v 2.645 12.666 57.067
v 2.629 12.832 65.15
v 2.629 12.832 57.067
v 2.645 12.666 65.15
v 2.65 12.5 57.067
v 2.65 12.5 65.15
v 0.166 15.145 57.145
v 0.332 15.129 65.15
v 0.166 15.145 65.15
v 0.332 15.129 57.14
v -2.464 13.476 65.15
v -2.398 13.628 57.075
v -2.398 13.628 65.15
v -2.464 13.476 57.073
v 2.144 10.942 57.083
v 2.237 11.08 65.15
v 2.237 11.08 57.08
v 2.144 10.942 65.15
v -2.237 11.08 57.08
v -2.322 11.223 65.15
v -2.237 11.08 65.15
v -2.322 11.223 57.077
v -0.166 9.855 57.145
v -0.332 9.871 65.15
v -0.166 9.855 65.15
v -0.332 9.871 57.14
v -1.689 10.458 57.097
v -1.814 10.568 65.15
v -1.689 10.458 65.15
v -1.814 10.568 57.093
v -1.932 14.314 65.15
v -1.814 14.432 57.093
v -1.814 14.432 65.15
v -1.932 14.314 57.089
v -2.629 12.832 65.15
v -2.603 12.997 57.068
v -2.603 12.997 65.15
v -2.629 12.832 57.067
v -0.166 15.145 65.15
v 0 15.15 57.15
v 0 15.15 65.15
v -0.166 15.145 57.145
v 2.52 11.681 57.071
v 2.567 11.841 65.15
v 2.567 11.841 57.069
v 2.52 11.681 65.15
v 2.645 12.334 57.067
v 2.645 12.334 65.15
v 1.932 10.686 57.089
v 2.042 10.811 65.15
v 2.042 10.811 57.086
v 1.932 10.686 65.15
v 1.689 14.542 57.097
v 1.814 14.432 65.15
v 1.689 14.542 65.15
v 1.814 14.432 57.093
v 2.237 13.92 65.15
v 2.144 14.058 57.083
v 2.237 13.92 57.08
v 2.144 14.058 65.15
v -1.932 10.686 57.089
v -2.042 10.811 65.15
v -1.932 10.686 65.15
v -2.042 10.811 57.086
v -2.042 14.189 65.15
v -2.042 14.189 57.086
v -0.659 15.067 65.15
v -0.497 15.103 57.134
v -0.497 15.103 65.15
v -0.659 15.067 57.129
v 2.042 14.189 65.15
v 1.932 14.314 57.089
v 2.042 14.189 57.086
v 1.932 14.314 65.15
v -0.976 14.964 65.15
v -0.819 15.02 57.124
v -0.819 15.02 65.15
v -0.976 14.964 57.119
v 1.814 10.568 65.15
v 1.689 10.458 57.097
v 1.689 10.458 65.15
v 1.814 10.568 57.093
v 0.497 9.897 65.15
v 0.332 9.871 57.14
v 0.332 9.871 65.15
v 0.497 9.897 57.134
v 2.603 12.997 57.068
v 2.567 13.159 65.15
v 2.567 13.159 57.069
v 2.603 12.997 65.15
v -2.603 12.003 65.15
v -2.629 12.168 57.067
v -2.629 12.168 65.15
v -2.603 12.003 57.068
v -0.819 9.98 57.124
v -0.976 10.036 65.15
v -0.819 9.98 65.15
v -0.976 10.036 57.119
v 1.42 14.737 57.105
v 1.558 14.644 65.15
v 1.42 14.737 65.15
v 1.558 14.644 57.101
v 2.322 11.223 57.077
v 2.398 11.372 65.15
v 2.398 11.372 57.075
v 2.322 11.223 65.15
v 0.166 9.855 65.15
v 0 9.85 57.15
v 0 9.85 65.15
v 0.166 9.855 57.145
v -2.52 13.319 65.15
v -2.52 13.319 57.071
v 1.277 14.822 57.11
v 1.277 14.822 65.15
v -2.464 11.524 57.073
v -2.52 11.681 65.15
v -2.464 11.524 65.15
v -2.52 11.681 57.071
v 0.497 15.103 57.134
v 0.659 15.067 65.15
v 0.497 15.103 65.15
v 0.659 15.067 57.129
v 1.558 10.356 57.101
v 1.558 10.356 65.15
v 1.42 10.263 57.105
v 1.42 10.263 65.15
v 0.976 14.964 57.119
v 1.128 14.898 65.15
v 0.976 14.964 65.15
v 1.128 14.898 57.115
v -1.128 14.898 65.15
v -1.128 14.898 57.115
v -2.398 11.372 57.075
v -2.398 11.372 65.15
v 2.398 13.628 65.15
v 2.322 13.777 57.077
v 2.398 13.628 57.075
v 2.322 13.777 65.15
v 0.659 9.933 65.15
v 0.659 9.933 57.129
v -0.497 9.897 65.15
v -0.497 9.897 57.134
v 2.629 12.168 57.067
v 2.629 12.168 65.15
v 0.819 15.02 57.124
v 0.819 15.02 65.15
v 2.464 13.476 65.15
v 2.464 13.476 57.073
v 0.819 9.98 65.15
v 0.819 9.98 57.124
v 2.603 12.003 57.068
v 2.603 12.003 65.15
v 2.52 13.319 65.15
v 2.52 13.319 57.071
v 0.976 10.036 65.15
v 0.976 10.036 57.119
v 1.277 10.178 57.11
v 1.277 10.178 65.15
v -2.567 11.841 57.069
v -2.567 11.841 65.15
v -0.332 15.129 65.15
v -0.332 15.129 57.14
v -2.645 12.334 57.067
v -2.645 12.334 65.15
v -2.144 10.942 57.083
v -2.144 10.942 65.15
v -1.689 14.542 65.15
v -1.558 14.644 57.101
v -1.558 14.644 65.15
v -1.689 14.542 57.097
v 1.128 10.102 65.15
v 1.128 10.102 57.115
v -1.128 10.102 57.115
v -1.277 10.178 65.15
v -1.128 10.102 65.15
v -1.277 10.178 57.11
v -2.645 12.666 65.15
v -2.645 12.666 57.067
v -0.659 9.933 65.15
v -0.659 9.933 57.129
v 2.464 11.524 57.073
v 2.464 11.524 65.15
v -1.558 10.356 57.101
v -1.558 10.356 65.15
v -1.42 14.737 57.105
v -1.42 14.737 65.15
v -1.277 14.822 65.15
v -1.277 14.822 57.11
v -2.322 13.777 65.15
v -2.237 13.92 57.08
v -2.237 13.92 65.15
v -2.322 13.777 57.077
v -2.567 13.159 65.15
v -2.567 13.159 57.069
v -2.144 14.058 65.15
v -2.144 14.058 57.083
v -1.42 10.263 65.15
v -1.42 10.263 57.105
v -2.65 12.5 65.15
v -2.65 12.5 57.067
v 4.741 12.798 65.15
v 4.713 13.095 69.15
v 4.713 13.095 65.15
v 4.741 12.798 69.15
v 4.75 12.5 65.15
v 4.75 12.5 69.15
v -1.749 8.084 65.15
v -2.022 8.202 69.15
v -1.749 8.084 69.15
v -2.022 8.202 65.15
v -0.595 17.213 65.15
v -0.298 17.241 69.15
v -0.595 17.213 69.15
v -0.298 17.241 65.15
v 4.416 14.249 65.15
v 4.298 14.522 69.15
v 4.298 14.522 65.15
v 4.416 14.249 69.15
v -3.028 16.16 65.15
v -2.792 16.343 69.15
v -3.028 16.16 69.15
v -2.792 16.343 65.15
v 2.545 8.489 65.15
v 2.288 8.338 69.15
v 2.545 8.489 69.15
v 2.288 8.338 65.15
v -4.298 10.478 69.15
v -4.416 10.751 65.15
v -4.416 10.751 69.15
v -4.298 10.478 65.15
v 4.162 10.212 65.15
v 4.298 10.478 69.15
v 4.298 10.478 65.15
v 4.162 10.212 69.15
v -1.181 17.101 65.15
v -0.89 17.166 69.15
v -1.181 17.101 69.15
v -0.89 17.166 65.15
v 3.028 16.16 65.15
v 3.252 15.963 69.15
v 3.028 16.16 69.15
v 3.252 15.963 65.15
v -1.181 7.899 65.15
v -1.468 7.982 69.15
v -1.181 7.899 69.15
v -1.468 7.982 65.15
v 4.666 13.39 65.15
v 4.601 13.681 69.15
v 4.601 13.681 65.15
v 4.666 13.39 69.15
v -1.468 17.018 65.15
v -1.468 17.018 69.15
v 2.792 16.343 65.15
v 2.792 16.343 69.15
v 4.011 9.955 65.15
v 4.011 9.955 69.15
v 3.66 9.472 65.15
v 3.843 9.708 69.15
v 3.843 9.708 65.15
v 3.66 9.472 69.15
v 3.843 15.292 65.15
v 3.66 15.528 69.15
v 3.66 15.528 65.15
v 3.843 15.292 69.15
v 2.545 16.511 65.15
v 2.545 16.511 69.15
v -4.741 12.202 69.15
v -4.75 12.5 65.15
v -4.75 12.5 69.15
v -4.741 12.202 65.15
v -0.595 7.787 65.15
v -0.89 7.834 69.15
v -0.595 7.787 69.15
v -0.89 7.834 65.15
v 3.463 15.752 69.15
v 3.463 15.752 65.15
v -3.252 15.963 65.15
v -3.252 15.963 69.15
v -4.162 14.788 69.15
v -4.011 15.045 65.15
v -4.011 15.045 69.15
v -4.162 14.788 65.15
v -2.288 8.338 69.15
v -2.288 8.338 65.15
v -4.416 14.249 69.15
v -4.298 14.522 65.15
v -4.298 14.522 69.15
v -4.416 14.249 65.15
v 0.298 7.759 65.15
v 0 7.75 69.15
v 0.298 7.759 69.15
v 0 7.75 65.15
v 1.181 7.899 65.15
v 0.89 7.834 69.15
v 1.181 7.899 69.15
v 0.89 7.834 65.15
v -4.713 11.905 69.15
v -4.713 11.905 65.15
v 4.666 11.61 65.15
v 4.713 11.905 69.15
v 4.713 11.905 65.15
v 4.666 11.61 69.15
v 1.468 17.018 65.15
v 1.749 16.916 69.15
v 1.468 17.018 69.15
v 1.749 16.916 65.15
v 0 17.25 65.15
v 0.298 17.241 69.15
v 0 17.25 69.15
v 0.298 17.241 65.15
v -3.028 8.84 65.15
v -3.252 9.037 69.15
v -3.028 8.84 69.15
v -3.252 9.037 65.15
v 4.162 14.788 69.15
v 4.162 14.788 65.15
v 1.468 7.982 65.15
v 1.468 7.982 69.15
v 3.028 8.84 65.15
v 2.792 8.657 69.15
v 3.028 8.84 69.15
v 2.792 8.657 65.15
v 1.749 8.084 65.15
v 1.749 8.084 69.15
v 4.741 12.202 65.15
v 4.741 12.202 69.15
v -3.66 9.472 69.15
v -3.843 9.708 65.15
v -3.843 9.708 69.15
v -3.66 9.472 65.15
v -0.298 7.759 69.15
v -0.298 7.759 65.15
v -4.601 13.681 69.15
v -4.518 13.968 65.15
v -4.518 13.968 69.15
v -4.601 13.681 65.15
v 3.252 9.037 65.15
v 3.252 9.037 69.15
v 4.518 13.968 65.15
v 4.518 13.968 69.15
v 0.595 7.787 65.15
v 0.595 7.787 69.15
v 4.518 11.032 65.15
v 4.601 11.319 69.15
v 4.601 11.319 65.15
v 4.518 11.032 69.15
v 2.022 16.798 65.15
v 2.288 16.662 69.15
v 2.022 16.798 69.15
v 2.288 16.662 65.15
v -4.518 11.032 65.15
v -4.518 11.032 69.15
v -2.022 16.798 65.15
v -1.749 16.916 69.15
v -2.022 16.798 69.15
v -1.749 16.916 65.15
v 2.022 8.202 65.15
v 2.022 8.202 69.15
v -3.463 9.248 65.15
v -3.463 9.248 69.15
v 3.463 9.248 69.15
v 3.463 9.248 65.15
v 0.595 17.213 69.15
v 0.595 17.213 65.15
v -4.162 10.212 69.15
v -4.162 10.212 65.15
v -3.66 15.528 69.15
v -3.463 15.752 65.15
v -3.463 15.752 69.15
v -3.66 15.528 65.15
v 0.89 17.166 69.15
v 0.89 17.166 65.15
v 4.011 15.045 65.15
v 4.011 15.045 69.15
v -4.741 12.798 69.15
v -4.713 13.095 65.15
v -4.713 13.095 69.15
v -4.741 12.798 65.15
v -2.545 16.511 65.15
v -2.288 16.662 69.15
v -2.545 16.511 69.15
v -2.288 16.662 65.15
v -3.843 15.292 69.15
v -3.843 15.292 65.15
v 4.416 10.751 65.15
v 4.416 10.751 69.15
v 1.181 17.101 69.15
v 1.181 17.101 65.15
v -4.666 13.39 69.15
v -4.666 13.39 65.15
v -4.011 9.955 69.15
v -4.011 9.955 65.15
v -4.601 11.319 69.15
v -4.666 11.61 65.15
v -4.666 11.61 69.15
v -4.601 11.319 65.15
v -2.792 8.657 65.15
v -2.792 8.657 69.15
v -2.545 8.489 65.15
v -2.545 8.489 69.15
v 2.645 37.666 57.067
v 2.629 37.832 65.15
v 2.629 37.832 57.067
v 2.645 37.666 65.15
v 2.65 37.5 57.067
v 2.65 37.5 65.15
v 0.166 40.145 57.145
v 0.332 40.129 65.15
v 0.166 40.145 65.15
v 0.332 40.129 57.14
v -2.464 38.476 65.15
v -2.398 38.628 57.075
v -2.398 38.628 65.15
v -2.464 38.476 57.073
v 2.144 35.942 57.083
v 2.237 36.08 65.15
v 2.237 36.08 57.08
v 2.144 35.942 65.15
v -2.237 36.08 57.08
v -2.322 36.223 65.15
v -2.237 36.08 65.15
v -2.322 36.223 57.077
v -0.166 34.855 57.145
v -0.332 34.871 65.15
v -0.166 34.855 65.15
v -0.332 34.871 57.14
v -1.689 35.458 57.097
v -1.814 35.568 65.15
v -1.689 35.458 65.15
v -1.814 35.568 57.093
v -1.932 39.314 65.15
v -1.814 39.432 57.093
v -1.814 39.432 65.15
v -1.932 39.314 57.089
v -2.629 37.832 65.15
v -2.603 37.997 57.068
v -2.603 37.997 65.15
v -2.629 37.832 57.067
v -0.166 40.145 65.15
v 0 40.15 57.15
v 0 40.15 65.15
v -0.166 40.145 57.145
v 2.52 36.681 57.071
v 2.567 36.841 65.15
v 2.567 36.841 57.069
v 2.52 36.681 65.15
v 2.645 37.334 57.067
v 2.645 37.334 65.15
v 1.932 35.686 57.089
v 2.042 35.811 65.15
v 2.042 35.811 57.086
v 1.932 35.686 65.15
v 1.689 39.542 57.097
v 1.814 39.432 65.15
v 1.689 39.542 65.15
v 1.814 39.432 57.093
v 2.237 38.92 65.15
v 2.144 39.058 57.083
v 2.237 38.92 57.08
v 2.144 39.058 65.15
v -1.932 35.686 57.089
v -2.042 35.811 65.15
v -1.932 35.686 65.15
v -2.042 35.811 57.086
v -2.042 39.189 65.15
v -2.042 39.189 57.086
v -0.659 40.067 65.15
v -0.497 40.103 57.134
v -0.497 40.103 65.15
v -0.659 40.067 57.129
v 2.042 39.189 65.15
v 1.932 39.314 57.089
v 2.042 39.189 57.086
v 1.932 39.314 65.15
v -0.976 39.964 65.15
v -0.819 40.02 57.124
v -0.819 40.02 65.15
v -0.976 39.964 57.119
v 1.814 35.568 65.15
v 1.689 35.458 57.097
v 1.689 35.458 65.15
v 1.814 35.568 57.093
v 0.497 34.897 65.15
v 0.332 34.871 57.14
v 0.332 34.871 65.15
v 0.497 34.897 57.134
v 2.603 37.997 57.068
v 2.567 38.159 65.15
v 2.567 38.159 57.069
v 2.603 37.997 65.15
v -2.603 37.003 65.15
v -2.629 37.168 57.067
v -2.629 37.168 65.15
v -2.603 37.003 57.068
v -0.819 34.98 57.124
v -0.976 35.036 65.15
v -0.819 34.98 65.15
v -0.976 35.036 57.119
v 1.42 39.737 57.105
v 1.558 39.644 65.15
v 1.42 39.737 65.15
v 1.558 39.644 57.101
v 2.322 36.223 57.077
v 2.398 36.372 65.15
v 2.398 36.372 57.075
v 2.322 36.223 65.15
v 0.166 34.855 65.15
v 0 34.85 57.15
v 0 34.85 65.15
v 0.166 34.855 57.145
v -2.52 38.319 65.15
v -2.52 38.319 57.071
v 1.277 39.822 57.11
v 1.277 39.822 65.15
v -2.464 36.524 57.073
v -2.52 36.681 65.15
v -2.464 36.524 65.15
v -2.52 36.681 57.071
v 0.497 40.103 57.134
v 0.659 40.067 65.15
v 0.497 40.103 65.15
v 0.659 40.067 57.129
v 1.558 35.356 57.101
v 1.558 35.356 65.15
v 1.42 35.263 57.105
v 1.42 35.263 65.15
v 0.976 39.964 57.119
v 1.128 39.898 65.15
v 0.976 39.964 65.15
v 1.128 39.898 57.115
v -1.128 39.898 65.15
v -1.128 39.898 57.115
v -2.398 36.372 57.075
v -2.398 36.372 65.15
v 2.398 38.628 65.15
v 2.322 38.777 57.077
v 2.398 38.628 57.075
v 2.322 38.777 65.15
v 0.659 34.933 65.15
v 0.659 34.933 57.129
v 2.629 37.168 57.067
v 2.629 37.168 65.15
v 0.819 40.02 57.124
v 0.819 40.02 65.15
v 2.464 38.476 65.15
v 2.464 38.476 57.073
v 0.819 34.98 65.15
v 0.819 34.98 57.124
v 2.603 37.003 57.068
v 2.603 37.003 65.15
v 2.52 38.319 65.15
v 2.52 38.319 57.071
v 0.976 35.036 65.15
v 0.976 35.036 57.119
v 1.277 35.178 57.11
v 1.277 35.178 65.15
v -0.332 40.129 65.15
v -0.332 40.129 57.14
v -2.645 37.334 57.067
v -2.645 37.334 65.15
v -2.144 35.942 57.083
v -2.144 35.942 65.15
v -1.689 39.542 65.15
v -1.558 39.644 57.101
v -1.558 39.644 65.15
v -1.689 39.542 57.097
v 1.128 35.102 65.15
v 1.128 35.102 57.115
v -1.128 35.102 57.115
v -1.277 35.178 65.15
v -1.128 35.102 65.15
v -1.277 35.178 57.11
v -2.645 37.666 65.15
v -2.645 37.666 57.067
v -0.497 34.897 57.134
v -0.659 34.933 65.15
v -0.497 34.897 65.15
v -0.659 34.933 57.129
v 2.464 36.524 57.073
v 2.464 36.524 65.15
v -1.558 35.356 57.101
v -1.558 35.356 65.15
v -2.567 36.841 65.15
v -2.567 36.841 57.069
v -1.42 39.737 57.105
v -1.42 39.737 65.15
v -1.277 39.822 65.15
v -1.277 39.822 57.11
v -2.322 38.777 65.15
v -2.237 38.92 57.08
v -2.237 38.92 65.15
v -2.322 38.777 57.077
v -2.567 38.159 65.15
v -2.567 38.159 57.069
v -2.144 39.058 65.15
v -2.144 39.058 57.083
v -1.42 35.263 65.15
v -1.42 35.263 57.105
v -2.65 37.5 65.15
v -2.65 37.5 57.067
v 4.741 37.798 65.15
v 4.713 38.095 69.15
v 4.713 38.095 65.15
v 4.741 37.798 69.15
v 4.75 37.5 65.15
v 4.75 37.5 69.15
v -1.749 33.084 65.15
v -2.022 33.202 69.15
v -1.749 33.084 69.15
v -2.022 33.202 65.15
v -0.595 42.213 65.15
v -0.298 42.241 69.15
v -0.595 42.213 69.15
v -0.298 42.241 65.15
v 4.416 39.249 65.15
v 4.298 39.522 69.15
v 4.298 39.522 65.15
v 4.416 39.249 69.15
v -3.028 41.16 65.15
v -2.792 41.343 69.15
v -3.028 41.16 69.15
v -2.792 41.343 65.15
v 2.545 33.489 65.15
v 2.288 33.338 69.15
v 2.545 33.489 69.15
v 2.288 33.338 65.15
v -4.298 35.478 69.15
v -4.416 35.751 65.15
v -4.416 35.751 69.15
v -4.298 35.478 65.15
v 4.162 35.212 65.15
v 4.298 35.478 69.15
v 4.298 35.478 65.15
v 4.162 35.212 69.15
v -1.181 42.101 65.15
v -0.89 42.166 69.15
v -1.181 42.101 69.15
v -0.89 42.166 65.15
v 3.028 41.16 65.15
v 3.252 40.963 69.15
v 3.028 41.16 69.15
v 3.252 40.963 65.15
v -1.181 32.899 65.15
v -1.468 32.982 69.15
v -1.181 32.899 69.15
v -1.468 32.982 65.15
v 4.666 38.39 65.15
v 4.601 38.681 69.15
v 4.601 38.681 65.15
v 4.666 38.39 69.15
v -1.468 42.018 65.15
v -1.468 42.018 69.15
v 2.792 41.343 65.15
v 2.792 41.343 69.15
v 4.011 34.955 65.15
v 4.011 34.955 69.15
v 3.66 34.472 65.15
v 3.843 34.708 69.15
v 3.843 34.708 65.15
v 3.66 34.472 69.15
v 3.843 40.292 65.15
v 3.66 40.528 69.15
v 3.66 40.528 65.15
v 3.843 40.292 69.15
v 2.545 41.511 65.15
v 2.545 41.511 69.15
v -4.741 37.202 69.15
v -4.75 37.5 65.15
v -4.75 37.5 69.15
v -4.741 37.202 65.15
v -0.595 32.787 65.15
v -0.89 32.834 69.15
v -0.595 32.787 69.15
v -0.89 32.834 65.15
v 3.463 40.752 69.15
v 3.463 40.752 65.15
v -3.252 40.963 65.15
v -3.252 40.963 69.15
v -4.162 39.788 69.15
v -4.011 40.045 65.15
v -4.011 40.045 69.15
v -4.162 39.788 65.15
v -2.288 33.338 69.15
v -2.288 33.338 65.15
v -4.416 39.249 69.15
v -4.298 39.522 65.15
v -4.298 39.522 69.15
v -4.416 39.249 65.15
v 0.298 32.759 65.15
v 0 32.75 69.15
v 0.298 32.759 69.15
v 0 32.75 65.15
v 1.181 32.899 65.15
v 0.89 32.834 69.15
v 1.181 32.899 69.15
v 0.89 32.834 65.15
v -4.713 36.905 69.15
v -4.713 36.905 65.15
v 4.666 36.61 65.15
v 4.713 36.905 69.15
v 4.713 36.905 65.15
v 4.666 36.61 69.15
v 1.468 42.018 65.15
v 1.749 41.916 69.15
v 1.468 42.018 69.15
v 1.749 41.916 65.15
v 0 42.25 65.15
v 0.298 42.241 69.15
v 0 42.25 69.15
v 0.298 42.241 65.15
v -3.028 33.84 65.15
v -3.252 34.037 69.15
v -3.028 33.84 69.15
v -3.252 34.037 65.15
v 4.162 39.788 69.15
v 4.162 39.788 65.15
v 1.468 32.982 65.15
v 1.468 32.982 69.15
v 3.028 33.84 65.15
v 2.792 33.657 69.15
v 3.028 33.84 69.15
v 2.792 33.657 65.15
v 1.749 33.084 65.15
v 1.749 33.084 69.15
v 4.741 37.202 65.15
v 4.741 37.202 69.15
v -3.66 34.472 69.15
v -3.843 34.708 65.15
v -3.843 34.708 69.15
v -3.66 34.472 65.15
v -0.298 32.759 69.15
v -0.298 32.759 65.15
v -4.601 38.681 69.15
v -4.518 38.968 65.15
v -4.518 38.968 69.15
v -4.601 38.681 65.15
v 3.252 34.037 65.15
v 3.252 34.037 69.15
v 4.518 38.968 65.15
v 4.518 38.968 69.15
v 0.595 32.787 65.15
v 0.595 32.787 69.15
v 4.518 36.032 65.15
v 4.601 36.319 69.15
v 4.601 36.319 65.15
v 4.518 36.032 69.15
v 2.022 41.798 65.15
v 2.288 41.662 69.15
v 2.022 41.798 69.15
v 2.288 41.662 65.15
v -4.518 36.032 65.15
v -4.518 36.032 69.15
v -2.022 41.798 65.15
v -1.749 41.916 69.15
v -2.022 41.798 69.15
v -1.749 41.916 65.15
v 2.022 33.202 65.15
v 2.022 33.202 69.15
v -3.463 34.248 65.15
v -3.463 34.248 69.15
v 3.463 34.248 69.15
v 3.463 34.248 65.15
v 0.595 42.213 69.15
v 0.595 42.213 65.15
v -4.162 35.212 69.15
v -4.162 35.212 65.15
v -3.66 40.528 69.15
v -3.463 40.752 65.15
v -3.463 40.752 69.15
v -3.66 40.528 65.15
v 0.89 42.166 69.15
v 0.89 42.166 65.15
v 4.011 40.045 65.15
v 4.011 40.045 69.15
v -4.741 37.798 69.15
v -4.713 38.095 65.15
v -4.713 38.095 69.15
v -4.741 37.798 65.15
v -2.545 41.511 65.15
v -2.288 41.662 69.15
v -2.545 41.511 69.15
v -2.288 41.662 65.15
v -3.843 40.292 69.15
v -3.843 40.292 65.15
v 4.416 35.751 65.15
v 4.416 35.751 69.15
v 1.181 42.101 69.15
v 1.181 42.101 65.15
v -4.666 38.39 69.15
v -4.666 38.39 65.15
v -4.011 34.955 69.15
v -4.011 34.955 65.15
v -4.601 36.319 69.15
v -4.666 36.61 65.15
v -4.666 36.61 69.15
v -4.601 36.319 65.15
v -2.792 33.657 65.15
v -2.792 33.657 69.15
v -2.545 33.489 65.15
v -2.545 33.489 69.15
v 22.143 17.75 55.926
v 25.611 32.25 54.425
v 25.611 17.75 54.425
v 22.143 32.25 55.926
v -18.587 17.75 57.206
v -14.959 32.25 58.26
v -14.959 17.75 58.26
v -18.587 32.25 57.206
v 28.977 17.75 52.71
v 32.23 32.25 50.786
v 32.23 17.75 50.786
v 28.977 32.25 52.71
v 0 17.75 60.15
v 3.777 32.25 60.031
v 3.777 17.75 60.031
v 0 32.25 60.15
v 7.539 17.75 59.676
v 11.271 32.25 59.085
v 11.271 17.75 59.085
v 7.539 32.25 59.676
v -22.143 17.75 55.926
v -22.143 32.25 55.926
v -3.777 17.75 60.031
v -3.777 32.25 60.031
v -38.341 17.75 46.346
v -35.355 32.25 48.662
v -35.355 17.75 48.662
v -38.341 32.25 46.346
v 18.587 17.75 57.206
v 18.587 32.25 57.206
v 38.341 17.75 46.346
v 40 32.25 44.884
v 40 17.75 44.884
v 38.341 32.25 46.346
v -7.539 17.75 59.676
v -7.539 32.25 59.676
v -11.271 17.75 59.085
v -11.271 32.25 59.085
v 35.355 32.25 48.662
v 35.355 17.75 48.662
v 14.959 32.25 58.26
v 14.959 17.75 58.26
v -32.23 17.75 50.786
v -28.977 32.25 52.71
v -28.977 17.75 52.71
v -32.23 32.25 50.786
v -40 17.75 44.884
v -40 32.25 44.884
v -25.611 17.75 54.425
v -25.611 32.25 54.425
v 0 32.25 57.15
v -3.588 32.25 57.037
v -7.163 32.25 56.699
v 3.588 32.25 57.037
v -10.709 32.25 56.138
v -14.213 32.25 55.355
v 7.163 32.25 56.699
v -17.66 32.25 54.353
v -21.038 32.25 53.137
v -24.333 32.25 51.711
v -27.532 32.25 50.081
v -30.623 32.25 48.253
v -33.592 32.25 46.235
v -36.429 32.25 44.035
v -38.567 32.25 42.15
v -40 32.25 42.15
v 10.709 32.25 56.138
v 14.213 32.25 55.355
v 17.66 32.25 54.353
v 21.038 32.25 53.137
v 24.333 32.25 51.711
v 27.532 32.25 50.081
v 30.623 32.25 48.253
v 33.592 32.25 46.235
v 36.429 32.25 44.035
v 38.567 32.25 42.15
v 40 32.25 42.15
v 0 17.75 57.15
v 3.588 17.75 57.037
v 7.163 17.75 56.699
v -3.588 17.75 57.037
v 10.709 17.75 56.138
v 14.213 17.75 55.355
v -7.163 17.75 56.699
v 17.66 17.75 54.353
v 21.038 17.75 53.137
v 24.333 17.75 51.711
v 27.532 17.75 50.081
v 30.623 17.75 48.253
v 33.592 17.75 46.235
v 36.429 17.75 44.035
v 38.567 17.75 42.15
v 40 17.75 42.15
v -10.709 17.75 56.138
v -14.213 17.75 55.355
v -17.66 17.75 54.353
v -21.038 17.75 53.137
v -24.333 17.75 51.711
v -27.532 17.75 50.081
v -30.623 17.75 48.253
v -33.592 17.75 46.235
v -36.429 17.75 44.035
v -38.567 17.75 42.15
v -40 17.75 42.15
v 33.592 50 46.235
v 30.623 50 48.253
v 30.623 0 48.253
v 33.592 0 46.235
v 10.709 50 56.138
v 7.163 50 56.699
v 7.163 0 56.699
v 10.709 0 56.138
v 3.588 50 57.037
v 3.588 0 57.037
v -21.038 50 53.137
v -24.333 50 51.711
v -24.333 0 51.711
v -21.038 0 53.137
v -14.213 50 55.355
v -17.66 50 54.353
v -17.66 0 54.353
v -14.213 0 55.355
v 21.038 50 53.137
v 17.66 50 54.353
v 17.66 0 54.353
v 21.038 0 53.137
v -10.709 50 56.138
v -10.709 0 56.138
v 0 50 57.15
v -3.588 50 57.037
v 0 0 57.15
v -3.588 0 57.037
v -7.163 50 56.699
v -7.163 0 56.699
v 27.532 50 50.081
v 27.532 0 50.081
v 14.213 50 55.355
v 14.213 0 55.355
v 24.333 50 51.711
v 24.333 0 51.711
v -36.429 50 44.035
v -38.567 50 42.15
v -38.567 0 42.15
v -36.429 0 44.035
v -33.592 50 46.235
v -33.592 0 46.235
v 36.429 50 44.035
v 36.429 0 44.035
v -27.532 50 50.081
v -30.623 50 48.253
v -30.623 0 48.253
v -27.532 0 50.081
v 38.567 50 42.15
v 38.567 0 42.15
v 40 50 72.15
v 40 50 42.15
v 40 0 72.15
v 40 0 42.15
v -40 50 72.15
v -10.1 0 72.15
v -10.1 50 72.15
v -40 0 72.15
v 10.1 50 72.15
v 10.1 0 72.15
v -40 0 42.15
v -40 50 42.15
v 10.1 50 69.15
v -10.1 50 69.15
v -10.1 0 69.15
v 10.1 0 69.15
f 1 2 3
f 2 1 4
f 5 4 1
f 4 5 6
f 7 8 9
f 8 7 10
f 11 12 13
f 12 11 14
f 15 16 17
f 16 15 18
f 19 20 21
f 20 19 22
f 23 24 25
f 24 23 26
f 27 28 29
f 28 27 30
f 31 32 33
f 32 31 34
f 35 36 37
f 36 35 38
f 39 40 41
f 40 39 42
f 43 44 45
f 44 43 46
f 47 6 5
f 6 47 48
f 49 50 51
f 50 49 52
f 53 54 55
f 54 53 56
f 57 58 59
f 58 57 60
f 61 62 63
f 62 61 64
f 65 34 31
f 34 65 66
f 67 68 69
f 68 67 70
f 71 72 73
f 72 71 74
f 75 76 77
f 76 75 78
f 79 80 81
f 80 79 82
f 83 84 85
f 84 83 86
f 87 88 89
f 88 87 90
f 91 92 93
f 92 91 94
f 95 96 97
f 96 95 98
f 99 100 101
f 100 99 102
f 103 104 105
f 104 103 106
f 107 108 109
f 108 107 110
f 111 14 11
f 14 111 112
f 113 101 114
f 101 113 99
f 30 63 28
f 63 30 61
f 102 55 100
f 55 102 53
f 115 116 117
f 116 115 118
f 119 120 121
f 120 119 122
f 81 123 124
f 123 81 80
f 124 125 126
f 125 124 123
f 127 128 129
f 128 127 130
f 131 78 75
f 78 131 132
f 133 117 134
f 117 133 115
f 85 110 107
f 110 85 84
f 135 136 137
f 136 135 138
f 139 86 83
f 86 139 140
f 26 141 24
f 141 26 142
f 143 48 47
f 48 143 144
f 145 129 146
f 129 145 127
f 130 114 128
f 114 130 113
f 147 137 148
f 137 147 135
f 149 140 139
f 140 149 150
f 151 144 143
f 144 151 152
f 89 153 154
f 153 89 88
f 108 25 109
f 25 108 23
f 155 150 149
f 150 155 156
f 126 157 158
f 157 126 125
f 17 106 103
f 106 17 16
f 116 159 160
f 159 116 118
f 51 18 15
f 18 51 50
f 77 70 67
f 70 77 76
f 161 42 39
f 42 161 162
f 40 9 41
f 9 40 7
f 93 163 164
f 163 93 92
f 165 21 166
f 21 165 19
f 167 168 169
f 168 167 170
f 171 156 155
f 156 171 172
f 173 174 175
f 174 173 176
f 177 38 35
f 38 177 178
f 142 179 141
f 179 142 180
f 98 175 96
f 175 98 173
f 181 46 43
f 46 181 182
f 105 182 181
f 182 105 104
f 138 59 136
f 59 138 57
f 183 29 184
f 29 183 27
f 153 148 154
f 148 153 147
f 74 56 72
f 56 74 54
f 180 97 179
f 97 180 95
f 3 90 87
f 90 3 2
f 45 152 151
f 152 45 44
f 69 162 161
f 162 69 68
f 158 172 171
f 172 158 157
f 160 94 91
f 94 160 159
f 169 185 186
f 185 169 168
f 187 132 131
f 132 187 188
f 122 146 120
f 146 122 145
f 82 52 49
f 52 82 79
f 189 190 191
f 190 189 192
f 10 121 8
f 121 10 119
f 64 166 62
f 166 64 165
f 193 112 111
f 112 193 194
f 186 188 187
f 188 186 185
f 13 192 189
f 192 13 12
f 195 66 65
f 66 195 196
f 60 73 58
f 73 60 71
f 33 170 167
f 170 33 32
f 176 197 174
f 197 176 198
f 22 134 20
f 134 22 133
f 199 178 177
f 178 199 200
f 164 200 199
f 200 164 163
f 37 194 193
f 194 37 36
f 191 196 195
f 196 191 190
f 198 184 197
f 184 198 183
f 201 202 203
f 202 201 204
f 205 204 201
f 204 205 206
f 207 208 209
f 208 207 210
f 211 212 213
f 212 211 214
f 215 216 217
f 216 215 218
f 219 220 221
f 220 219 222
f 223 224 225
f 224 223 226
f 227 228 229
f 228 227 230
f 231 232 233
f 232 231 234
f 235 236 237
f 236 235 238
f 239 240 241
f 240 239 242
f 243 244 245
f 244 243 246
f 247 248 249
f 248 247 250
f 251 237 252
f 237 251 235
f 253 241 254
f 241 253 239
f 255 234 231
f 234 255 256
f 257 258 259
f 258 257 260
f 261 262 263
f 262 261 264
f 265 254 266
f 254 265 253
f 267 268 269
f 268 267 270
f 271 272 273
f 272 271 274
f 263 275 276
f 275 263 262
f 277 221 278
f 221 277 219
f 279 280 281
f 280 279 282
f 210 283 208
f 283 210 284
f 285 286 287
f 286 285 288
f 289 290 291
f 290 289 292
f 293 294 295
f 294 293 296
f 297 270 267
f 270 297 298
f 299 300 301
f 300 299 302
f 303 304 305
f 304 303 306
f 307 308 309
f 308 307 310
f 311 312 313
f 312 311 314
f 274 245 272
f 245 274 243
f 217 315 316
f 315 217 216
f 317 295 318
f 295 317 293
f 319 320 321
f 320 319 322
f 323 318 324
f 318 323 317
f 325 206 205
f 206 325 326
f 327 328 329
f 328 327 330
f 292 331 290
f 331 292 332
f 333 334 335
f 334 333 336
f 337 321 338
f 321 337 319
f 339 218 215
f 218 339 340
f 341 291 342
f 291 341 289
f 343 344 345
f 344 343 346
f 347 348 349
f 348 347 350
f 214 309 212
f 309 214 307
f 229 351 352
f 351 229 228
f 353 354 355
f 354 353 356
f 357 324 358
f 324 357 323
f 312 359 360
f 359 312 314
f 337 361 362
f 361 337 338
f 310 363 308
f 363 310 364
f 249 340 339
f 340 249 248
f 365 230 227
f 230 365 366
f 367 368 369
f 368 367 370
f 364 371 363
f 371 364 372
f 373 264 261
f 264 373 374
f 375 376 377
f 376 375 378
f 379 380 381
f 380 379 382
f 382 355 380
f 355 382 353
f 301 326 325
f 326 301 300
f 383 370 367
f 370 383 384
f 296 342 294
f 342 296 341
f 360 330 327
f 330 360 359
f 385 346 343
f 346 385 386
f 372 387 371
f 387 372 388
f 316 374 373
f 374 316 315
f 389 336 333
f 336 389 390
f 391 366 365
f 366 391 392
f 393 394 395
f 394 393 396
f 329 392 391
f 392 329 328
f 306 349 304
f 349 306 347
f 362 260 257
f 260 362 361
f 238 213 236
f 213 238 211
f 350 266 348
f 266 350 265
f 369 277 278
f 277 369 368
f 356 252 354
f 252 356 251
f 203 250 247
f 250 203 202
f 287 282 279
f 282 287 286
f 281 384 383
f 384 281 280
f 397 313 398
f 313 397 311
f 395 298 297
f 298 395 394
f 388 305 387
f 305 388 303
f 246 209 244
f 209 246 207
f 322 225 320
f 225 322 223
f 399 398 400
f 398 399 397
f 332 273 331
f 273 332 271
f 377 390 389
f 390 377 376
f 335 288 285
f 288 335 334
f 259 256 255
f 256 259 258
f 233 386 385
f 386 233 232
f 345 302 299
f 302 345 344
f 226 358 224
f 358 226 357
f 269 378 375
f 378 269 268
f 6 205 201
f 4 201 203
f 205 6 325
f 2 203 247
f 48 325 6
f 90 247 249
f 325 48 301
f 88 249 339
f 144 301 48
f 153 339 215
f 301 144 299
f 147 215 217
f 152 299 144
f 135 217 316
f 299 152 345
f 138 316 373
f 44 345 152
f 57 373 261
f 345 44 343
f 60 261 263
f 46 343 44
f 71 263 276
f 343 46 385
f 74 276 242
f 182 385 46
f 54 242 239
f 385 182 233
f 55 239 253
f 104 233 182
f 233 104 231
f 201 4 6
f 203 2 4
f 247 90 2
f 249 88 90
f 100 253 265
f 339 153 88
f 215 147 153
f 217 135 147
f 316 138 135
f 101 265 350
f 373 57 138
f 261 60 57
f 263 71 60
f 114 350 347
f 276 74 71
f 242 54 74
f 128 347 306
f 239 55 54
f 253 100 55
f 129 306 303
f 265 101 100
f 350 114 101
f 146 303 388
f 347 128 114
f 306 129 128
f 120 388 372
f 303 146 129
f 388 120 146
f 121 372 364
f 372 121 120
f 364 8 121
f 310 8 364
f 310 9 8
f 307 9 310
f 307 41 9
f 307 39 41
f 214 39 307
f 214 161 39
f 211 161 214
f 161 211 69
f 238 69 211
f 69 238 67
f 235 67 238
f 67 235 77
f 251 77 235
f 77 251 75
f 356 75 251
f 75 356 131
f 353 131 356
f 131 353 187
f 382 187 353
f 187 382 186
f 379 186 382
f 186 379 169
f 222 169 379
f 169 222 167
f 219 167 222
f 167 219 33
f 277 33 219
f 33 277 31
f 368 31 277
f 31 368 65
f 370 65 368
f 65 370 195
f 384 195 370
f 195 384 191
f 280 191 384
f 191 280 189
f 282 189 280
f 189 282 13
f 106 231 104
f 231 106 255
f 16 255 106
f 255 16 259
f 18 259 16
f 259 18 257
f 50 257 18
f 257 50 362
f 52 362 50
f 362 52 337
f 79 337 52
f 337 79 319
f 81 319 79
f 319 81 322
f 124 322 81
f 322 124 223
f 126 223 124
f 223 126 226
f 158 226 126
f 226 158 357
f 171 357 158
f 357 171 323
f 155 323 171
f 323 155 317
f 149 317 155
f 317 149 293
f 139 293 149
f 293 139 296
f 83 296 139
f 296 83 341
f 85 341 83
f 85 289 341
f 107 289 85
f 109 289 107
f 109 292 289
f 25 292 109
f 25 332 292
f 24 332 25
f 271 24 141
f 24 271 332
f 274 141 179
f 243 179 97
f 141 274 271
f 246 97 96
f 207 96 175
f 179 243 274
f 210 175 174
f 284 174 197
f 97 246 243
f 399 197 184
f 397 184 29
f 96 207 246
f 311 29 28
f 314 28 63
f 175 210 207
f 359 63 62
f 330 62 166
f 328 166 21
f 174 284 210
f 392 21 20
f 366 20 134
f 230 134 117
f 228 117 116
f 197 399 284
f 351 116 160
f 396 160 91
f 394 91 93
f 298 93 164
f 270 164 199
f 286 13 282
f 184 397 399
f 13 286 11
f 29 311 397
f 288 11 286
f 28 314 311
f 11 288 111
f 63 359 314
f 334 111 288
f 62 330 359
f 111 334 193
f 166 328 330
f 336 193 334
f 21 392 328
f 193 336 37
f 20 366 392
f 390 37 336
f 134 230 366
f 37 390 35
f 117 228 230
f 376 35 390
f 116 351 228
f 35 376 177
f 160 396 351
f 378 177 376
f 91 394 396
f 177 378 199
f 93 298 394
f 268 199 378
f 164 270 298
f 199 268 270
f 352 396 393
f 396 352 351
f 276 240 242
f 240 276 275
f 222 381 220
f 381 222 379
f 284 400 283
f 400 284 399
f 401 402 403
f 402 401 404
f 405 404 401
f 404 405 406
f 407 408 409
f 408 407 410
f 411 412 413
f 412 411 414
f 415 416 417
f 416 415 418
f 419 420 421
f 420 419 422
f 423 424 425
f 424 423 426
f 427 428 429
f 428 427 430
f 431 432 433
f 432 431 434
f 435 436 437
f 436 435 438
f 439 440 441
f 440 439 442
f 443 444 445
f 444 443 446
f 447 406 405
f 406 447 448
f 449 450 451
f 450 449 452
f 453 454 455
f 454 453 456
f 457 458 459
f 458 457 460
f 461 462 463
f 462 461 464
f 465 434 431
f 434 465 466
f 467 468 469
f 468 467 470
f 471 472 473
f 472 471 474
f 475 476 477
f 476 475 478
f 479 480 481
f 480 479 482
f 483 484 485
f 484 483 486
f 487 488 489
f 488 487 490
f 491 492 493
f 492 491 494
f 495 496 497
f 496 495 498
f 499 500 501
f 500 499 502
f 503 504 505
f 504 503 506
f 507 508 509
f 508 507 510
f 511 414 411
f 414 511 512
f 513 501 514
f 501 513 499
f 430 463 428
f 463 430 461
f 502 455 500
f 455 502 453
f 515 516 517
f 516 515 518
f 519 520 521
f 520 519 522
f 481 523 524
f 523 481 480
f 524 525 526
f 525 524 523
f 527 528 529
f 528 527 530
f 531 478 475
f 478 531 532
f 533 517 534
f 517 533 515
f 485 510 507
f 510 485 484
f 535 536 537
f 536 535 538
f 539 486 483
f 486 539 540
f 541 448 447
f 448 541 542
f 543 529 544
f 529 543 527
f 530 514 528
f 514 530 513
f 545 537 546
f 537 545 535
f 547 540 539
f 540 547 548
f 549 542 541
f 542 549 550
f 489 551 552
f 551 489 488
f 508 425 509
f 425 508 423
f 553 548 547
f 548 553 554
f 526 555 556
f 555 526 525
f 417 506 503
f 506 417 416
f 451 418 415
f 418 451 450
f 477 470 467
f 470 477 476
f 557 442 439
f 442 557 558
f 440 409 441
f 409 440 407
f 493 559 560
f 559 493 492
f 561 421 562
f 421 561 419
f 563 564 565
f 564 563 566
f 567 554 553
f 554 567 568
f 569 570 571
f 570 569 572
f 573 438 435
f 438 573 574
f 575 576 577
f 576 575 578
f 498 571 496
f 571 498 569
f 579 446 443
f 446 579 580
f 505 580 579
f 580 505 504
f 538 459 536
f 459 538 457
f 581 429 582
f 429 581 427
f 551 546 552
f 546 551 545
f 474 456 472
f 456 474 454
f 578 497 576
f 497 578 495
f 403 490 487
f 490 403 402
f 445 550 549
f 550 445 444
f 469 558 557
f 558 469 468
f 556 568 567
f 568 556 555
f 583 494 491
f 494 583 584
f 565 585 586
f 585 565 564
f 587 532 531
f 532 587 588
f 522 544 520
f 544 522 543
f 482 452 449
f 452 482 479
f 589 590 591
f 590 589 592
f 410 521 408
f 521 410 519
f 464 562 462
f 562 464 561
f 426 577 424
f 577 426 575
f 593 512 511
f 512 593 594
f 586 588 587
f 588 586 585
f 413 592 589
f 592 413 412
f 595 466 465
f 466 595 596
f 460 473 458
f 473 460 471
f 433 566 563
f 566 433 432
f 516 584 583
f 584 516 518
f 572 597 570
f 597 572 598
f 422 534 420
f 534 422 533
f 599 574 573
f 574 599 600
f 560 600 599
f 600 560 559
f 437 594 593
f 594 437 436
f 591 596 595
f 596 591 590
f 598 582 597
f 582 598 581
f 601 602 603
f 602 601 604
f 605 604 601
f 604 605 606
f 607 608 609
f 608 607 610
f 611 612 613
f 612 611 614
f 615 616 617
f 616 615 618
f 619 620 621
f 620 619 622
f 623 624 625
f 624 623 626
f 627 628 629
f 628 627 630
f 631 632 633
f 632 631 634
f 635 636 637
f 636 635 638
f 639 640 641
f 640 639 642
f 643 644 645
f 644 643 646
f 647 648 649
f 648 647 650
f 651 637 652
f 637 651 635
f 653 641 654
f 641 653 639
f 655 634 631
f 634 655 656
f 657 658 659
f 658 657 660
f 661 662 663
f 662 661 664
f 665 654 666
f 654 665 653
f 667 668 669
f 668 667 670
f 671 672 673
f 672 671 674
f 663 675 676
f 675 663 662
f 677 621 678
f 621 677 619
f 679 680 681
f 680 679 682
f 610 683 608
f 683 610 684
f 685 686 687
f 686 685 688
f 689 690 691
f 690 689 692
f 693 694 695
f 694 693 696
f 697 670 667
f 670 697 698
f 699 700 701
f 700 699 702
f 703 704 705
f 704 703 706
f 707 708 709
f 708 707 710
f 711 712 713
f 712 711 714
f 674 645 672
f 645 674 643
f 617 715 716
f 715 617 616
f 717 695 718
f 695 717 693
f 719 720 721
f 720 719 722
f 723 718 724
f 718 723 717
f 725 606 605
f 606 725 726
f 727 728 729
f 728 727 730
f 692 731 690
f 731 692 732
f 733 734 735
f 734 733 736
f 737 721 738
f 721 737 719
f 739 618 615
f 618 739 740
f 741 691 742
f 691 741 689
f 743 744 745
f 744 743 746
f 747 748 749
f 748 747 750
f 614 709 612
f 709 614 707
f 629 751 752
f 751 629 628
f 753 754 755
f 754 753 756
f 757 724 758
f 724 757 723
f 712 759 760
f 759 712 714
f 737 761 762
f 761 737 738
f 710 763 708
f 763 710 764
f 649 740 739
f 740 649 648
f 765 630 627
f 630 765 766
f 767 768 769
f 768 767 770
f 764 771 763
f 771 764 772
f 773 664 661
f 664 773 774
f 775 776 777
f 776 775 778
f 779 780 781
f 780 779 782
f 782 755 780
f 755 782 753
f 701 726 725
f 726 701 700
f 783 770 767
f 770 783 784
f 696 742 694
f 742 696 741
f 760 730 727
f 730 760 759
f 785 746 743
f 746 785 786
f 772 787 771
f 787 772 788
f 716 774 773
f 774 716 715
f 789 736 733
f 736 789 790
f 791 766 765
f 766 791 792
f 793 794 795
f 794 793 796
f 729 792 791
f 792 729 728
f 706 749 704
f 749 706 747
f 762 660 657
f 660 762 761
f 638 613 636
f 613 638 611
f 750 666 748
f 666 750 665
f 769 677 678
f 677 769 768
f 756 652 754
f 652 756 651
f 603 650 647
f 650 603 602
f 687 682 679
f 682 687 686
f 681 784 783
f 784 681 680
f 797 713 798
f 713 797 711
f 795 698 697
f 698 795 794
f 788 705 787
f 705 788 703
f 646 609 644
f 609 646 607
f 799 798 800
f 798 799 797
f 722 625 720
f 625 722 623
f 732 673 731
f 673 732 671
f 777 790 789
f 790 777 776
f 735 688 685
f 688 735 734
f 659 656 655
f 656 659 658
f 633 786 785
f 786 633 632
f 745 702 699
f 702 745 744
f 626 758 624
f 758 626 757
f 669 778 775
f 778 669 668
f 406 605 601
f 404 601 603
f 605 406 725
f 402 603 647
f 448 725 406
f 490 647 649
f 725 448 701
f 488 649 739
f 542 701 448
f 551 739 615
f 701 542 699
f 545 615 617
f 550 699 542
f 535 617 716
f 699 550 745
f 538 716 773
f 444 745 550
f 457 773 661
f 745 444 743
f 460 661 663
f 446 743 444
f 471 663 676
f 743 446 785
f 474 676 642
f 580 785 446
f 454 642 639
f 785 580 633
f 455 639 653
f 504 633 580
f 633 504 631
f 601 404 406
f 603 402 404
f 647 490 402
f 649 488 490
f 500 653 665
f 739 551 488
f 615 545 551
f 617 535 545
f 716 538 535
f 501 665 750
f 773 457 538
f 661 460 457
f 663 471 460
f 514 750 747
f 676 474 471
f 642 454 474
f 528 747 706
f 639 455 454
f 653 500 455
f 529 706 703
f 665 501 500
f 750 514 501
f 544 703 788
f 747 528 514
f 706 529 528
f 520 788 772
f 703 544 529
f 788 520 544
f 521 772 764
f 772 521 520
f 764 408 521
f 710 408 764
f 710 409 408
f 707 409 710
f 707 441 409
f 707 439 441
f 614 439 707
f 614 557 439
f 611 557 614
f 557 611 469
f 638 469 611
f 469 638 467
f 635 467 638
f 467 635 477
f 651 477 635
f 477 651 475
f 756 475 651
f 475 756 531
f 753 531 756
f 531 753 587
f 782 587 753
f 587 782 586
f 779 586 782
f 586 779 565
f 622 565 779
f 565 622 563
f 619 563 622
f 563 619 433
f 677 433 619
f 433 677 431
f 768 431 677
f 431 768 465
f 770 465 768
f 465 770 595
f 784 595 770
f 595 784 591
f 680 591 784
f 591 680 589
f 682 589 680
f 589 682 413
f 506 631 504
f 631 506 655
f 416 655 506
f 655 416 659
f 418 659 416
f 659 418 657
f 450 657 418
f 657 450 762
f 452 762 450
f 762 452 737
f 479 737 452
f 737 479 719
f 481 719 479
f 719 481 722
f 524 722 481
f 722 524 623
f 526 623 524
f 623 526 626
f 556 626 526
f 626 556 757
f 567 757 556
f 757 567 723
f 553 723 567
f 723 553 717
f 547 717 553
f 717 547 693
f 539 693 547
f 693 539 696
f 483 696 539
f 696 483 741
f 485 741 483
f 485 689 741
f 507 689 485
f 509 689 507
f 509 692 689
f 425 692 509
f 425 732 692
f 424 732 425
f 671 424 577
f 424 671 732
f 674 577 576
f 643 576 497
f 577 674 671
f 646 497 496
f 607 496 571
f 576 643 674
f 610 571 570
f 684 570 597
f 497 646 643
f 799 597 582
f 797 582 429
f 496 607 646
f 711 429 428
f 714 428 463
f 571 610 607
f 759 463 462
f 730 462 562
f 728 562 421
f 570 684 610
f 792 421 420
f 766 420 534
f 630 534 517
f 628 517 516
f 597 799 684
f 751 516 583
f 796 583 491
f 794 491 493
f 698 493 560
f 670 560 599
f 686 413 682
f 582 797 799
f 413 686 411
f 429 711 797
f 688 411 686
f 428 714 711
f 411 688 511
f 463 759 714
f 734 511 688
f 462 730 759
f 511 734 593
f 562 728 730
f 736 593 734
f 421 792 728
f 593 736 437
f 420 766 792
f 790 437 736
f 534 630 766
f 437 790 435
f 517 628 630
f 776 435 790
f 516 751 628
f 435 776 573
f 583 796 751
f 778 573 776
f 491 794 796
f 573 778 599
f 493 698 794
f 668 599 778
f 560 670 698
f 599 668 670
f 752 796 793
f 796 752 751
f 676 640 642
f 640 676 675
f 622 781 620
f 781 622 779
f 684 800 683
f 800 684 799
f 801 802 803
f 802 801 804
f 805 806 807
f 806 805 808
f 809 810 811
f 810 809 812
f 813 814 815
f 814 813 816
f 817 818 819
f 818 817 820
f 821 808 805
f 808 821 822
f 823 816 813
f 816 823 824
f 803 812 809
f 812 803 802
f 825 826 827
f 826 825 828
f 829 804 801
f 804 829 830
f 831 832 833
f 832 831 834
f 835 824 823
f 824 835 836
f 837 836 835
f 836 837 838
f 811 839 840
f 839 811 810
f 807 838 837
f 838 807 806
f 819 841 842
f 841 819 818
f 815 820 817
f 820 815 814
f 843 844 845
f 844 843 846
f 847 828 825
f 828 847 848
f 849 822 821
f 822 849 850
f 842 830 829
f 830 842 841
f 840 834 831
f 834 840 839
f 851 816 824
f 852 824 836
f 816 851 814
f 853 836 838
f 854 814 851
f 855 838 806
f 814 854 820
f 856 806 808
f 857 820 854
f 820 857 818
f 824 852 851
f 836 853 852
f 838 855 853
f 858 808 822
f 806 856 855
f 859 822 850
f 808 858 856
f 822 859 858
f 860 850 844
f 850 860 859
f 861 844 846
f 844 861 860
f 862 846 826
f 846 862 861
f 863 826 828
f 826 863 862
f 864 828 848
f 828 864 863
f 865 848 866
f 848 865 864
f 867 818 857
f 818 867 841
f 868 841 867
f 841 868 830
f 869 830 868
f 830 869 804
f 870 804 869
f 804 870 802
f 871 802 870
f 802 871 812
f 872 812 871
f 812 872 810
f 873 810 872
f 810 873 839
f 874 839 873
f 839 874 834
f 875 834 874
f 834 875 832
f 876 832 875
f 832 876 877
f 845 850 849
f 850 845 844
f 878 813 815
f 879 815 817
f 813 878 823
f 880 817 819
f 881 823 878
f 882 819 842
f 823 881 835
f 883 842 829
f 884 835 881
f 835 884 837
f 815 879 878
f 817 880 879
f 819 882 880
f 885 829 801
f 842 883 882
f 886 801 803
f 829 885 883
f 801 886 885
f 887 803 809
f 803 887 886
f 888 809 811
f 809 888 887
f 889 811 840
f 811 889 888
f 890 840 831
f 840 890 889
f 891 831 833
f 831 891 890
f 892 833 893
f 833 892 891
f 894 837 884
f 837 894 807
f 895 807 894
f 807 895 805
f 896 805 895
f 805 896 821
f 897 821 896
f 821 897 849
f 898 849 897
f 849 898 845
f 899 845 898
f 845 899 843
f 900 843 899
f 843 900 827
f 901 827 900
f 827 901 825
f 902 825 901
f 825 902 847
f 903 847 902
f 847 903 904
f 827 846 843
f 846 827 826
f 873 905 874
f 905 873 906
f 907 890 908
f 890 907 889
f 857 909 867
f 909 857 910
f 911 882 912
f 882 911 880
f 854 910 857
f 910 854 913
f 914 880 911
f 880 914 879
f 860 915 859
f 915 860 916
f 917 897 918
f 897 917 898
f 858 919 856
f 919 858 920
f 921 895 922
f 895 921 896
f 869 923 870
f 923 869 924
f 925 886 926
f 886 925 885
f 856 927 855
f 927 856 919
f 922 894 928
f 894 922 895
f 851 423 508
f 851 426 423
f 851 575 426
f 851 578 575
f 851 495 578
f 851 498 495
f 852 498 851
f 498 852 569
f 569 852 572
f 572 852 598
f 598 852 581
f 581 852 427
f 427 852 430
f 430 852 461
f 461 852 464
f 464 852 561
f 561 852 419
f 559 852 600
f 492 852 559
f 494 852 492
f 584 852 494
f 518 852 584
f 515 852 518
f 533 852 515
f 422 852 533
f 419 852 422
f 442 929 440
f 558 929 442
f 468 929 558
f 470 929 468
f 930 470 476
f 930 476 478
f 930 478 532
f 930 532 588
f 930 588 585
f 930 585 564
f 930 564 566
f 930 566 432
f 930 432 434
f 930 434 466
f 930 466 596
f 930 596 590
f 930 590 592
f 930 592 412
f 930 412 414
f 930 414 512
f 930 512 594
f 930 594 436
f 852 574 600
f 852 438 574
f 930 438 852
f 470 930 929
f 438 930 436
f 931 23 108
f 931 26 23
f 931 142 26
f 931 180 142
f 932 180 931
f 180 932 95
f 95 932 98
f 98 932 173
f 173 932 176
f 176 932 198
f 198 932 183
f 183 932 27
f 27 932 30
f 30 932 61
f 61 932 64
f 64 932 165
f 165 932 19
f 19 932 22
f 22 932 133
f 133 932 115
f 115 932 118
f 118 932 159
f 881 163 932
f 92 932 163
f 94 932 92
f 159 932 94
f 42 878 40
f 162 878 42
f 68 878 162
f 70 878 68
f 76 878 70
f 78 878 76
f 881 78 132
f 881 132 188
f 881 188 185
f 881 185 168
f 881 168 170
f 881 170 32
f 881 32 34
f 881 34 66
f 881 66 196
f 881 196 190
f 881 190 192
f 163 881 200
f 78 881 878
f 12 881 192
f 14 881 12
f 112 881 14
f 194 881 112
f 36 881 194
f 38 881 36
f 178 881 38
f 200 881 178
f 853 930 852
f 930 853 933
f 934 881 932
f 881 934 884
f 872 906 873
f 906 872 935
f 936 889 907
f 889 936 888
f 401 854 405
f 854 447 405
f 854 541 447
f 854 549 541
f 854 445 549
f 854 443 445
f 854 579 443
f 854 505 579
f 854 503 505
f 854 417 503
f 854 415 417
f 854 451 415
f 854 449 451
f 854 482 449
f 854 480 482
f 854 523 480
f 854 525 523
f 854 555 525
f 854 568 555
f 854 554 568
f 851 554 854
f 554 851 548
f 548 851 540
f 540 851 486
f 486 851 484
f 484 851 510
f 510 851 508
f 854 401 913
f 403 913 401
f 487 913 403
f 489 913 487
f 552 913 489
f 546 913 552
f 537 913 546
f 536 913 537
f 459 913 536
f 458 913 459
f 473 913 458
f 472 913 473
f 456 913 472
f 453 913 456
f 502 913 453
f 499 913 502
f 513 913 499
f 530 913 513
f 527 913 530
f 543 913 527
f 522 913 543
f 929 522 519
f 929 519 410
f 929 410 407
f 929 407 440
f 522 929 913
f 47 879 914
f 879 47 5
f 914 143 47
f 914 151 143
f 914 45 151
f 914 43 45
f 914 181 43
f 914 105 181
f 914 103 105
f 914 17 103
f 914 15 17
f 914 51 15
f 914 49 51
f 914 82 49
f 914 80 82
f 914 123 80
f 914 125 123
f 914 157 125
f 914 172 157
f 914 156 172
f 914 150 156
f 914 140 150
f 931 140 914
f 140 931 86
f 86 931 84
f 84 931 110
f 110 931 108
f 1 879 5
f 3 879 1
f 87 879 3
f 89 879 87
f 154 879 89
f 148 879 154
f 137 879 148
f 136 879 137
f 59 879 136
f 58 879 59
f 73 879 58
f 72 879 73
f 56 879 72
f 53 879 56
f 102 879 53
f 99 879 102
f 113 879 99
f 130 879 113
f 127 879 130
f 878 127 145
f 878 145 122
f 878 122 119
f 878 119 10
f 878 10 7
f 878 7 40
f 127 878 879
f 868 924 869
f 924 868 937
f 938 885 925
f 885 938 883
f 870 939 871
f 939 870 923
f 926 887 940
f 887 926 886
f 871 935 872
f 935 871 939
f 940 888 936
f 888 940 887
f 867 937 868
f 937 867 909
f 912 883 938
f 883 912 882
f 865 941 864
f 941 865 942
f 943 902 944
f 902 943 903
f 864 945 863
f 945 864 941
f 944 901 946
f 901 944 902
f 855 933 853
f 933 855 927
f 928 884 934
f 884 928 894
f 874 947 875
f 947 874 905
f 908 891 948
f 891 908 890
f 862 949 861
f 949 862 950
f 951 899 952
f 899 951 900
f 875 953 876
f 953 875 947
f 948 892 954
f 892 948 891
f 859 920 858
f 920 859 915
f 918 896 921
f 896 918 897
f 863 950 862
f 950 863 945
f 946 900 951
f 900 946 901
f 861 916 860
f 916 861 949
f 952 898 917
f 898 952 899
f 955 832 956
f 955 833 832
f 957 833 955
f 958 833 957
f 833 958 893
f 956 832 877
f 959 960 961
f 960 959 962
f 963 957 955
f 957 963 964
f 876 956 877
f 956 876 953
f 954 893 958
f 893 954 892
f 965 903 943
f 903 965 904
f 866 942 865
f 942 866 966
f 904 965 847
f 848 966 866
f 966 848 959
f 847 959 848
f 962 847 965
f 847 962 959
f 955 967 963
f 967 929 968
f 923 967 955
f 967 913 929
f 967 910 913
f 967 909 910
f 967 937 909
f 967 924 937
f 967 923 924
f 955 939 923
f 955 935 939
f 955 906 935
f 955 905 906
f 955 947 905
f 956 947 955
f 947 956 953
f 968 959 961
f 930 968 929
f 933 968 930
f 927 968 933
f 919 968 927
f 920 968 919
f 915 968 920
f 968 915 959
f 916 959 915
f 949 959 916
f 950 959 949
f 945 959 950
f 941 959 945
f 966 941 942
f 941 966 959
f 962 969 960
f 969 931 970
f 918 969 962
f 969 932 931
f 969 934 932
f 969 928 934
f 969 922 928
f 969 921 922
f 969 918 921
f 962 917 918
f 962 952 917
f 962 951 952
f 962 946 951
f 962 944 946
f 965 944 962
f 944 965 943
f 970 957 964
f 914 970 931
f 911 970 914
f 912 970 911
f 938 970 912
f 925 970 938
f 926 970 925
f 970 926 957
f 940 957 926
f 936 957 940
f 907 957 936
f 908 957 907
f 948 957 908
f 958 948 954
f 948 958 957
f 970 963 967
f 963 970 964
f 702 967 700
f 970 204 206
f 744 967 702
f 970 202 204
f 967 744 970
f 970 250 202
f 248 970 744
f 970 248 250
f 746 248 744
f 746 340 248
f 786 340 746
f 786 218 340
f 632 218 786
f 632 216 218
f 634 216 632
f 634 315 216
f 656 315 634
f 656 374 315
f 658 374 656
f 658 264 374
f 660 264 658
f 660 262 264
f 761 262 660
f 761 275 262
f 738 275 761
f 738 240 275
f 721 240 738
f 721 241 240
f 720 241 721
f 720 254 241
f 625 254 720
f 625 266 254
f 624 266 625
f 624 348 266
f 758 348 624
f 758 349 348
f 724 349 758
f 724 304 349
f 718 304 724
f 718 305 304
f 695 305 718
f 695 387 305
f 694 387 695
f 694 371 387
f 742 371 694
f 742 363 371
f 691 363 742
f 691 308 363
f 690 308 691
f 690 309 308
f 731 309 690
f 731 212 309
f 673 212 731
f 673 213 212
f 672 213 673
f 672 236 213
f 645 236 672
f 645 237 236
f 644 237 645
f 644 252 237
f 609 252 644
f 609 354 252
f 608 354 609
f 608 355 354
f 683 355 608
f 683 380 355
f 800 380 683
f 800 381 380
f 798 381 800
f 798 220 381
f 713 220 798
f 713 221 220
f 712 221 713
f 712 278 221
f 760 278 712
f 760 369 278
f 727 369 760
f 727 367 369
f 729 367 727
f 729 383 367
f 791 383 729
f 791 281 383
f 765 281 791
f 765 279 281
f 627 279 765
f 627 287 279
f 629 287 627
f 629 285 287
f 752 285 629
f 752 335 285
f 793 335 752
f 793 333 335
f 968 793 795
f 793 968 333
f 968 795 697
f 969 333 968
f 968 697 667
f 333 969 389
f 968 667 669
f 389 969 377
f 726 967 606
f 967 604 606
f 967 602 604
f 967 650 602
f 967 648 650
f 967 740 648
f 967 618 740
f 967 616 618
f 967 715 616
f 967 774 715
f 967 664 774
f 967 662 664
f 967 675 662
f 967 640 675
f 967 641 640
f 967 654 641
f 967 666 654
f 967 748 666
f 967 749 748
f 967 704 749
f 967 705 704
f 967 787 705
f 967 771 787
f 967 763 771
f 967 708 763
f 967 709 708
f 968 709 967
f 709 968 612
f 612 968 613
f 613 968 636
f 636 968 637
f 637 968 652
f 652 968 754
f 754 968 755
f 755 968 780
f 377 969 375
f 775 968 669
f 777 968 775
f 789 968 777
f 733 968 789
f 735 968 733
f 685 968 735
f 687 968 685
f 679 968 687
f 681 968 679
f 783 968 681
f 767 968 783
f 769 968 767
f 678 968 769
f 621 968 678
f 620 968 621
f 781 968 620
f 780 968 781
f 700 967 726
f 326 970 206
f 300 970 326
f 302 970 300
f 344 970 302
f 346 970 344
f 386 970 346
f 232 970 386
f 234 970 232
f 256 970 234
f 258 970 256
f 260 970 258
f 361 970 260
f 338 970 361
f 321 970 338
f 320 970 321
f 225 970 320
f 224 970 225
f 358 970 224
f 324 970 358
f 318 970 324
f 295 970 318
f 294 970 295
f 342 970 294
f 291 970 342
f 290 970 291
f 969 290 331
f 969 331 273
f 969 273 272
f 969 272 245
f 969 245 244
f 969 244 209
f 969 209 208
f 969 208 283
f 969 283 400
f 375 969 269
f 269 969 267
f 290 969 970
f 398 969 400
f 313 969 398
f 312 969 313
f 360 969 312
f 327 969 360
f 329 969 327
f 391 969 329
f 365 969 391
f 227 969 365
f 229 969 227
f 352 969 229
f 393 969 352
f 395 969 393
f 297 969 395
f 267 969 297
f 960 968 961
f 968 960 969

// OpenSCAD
// Parametric PVC-to-2020 Extrusion Mounting Bracket
// Designed for Project Blue-Water Rover ASV
//
// To use: Open this file in OpenSCAD (https://openscad.org), 
// select your ASV option preset, and go to File -> Export as STL.

$fn = 100; // Curve smoothness (resolution)

/* [ASV Model Options] */
// Select which design option to generate the bracket for:
// "A" = 2.53m scale (8" PVC)
// "B" = 3.40m centerline scale (6" PVC)
// "C" = 1.00m prototype scale (4" PVC)
asv_option = "C"; // [A, B, C]

// --- Parametric Defaults based on Option selection ---

// Outer Diameter of the PVC Pipe (mm)
pvc_od = (asv_option == "A") ? 219.1 :
         (asv_option == "B") ? 168.3 :
                               114.3; // Default Option C (4" Schedule 40 PVC)

// Overall width of the mounting block (mm)
bracket_width = (asv_option == "A") ? 140 :
                (asv_option == "B") ? 110 :
                                      80; // Default Option C

// Length of the bracket along the pipe direction (mm)
bracket_length = 50.0;

// Depth of the cradle cutout (how deep the pipe sits in the bracket, mm)
cradle_depth = 15.0;

// Thickness of the top section above the cradle cutout (mm)
top_thickness = 15.0;

// 2020 Extrusion alignment slot width (mm)
extrusion_width = 20.2; 
// 2020 Extrusion alignment slot depth (mm)
extrusion_depth = 3.0;

// Mounting hardware size (M5 hardware default)
bolt_diameter = 5.3;
counterbore_diameter = 9.5;
counterbore_depth = 7.0;

// Hose clamp wrap-around slot width (mm)
clamp_width = 14.5;
// Hose clamp slot thickness (mm)
clamp_thickness = 3.0;

// --- Calculated Geometry Constants ---
pipe_center_z = 0;
pipe_radius = pvc_od / 2;

block_top_z = pipe_radius + top_thickness;
block_bottom_z = pipe_radius - cradle_depth;
block_height = block_top_z - block_bottom_z;

module pvc_2020_bracket() {
    difference() {
        // 1. Main solid block of the bracket
        translate([-bracket_width/2, 0, block_bottom_z])
            cube([bracket_width, bracket_length, block_height]);
        
        // 2. Subtract PVC Pipe Cylinder (creates the cradle cutout at the bottom)
        translate([0, -1, pipe_center_z])
            rotate([-90, 0, 0])
                cylinder(r=pipe_radius, h=bracket_length + 2);
        
        // 3. Subtract 2020 Extrusion alignment slot on the flat top surface
        translate([-extrusion_width/2, -1, block_top_z - extrusion_depth])
            cube([extrusion_width, bracket_length + 2, extrusion_depth + 1]);
        
        // 4. Subtract Extrusion Mounting Bolt Holes (M5)
        // Two holes along the center line, spaced 25mm apart (adjust to your extrusion)
        for (y_offset = [bracket_length/2 - 12.5, bracket_length/2 + 12.5]) {
            // Main bolt shaft
            translate([0, y_offset, block_bottom_z - 1])
                cylinder(d=bolt_diameter, h=block_height + 2);
            
            // Counterbore for bolt heads (recessed from the top)
            translate([0, y_offset, block_top_z - counterbore_depth])
                cylinder(d=counterbore_diameter, h=counterbore_depth + 1);
        }
        
        // 5. Subtract Hose Clamp slot wrapping around the PVC
        // This is a concentric slot outside the pipe circumference allowing a metal band clamp or zip ties to pass through
        translate([0, bracket_length/2 - clamp_width/2, pipe_center_z])
            rotate([-90, 0, 0])
                difference() {
                    cylinder(r=pipe_radius + clamp_thickness, h=clamp_width);
                    translate([0, 0, -1])
                        cylinder(r=pipe_radius, h=clamp_width + 2);
                }
    }
}

pvc_2020_bracket();
